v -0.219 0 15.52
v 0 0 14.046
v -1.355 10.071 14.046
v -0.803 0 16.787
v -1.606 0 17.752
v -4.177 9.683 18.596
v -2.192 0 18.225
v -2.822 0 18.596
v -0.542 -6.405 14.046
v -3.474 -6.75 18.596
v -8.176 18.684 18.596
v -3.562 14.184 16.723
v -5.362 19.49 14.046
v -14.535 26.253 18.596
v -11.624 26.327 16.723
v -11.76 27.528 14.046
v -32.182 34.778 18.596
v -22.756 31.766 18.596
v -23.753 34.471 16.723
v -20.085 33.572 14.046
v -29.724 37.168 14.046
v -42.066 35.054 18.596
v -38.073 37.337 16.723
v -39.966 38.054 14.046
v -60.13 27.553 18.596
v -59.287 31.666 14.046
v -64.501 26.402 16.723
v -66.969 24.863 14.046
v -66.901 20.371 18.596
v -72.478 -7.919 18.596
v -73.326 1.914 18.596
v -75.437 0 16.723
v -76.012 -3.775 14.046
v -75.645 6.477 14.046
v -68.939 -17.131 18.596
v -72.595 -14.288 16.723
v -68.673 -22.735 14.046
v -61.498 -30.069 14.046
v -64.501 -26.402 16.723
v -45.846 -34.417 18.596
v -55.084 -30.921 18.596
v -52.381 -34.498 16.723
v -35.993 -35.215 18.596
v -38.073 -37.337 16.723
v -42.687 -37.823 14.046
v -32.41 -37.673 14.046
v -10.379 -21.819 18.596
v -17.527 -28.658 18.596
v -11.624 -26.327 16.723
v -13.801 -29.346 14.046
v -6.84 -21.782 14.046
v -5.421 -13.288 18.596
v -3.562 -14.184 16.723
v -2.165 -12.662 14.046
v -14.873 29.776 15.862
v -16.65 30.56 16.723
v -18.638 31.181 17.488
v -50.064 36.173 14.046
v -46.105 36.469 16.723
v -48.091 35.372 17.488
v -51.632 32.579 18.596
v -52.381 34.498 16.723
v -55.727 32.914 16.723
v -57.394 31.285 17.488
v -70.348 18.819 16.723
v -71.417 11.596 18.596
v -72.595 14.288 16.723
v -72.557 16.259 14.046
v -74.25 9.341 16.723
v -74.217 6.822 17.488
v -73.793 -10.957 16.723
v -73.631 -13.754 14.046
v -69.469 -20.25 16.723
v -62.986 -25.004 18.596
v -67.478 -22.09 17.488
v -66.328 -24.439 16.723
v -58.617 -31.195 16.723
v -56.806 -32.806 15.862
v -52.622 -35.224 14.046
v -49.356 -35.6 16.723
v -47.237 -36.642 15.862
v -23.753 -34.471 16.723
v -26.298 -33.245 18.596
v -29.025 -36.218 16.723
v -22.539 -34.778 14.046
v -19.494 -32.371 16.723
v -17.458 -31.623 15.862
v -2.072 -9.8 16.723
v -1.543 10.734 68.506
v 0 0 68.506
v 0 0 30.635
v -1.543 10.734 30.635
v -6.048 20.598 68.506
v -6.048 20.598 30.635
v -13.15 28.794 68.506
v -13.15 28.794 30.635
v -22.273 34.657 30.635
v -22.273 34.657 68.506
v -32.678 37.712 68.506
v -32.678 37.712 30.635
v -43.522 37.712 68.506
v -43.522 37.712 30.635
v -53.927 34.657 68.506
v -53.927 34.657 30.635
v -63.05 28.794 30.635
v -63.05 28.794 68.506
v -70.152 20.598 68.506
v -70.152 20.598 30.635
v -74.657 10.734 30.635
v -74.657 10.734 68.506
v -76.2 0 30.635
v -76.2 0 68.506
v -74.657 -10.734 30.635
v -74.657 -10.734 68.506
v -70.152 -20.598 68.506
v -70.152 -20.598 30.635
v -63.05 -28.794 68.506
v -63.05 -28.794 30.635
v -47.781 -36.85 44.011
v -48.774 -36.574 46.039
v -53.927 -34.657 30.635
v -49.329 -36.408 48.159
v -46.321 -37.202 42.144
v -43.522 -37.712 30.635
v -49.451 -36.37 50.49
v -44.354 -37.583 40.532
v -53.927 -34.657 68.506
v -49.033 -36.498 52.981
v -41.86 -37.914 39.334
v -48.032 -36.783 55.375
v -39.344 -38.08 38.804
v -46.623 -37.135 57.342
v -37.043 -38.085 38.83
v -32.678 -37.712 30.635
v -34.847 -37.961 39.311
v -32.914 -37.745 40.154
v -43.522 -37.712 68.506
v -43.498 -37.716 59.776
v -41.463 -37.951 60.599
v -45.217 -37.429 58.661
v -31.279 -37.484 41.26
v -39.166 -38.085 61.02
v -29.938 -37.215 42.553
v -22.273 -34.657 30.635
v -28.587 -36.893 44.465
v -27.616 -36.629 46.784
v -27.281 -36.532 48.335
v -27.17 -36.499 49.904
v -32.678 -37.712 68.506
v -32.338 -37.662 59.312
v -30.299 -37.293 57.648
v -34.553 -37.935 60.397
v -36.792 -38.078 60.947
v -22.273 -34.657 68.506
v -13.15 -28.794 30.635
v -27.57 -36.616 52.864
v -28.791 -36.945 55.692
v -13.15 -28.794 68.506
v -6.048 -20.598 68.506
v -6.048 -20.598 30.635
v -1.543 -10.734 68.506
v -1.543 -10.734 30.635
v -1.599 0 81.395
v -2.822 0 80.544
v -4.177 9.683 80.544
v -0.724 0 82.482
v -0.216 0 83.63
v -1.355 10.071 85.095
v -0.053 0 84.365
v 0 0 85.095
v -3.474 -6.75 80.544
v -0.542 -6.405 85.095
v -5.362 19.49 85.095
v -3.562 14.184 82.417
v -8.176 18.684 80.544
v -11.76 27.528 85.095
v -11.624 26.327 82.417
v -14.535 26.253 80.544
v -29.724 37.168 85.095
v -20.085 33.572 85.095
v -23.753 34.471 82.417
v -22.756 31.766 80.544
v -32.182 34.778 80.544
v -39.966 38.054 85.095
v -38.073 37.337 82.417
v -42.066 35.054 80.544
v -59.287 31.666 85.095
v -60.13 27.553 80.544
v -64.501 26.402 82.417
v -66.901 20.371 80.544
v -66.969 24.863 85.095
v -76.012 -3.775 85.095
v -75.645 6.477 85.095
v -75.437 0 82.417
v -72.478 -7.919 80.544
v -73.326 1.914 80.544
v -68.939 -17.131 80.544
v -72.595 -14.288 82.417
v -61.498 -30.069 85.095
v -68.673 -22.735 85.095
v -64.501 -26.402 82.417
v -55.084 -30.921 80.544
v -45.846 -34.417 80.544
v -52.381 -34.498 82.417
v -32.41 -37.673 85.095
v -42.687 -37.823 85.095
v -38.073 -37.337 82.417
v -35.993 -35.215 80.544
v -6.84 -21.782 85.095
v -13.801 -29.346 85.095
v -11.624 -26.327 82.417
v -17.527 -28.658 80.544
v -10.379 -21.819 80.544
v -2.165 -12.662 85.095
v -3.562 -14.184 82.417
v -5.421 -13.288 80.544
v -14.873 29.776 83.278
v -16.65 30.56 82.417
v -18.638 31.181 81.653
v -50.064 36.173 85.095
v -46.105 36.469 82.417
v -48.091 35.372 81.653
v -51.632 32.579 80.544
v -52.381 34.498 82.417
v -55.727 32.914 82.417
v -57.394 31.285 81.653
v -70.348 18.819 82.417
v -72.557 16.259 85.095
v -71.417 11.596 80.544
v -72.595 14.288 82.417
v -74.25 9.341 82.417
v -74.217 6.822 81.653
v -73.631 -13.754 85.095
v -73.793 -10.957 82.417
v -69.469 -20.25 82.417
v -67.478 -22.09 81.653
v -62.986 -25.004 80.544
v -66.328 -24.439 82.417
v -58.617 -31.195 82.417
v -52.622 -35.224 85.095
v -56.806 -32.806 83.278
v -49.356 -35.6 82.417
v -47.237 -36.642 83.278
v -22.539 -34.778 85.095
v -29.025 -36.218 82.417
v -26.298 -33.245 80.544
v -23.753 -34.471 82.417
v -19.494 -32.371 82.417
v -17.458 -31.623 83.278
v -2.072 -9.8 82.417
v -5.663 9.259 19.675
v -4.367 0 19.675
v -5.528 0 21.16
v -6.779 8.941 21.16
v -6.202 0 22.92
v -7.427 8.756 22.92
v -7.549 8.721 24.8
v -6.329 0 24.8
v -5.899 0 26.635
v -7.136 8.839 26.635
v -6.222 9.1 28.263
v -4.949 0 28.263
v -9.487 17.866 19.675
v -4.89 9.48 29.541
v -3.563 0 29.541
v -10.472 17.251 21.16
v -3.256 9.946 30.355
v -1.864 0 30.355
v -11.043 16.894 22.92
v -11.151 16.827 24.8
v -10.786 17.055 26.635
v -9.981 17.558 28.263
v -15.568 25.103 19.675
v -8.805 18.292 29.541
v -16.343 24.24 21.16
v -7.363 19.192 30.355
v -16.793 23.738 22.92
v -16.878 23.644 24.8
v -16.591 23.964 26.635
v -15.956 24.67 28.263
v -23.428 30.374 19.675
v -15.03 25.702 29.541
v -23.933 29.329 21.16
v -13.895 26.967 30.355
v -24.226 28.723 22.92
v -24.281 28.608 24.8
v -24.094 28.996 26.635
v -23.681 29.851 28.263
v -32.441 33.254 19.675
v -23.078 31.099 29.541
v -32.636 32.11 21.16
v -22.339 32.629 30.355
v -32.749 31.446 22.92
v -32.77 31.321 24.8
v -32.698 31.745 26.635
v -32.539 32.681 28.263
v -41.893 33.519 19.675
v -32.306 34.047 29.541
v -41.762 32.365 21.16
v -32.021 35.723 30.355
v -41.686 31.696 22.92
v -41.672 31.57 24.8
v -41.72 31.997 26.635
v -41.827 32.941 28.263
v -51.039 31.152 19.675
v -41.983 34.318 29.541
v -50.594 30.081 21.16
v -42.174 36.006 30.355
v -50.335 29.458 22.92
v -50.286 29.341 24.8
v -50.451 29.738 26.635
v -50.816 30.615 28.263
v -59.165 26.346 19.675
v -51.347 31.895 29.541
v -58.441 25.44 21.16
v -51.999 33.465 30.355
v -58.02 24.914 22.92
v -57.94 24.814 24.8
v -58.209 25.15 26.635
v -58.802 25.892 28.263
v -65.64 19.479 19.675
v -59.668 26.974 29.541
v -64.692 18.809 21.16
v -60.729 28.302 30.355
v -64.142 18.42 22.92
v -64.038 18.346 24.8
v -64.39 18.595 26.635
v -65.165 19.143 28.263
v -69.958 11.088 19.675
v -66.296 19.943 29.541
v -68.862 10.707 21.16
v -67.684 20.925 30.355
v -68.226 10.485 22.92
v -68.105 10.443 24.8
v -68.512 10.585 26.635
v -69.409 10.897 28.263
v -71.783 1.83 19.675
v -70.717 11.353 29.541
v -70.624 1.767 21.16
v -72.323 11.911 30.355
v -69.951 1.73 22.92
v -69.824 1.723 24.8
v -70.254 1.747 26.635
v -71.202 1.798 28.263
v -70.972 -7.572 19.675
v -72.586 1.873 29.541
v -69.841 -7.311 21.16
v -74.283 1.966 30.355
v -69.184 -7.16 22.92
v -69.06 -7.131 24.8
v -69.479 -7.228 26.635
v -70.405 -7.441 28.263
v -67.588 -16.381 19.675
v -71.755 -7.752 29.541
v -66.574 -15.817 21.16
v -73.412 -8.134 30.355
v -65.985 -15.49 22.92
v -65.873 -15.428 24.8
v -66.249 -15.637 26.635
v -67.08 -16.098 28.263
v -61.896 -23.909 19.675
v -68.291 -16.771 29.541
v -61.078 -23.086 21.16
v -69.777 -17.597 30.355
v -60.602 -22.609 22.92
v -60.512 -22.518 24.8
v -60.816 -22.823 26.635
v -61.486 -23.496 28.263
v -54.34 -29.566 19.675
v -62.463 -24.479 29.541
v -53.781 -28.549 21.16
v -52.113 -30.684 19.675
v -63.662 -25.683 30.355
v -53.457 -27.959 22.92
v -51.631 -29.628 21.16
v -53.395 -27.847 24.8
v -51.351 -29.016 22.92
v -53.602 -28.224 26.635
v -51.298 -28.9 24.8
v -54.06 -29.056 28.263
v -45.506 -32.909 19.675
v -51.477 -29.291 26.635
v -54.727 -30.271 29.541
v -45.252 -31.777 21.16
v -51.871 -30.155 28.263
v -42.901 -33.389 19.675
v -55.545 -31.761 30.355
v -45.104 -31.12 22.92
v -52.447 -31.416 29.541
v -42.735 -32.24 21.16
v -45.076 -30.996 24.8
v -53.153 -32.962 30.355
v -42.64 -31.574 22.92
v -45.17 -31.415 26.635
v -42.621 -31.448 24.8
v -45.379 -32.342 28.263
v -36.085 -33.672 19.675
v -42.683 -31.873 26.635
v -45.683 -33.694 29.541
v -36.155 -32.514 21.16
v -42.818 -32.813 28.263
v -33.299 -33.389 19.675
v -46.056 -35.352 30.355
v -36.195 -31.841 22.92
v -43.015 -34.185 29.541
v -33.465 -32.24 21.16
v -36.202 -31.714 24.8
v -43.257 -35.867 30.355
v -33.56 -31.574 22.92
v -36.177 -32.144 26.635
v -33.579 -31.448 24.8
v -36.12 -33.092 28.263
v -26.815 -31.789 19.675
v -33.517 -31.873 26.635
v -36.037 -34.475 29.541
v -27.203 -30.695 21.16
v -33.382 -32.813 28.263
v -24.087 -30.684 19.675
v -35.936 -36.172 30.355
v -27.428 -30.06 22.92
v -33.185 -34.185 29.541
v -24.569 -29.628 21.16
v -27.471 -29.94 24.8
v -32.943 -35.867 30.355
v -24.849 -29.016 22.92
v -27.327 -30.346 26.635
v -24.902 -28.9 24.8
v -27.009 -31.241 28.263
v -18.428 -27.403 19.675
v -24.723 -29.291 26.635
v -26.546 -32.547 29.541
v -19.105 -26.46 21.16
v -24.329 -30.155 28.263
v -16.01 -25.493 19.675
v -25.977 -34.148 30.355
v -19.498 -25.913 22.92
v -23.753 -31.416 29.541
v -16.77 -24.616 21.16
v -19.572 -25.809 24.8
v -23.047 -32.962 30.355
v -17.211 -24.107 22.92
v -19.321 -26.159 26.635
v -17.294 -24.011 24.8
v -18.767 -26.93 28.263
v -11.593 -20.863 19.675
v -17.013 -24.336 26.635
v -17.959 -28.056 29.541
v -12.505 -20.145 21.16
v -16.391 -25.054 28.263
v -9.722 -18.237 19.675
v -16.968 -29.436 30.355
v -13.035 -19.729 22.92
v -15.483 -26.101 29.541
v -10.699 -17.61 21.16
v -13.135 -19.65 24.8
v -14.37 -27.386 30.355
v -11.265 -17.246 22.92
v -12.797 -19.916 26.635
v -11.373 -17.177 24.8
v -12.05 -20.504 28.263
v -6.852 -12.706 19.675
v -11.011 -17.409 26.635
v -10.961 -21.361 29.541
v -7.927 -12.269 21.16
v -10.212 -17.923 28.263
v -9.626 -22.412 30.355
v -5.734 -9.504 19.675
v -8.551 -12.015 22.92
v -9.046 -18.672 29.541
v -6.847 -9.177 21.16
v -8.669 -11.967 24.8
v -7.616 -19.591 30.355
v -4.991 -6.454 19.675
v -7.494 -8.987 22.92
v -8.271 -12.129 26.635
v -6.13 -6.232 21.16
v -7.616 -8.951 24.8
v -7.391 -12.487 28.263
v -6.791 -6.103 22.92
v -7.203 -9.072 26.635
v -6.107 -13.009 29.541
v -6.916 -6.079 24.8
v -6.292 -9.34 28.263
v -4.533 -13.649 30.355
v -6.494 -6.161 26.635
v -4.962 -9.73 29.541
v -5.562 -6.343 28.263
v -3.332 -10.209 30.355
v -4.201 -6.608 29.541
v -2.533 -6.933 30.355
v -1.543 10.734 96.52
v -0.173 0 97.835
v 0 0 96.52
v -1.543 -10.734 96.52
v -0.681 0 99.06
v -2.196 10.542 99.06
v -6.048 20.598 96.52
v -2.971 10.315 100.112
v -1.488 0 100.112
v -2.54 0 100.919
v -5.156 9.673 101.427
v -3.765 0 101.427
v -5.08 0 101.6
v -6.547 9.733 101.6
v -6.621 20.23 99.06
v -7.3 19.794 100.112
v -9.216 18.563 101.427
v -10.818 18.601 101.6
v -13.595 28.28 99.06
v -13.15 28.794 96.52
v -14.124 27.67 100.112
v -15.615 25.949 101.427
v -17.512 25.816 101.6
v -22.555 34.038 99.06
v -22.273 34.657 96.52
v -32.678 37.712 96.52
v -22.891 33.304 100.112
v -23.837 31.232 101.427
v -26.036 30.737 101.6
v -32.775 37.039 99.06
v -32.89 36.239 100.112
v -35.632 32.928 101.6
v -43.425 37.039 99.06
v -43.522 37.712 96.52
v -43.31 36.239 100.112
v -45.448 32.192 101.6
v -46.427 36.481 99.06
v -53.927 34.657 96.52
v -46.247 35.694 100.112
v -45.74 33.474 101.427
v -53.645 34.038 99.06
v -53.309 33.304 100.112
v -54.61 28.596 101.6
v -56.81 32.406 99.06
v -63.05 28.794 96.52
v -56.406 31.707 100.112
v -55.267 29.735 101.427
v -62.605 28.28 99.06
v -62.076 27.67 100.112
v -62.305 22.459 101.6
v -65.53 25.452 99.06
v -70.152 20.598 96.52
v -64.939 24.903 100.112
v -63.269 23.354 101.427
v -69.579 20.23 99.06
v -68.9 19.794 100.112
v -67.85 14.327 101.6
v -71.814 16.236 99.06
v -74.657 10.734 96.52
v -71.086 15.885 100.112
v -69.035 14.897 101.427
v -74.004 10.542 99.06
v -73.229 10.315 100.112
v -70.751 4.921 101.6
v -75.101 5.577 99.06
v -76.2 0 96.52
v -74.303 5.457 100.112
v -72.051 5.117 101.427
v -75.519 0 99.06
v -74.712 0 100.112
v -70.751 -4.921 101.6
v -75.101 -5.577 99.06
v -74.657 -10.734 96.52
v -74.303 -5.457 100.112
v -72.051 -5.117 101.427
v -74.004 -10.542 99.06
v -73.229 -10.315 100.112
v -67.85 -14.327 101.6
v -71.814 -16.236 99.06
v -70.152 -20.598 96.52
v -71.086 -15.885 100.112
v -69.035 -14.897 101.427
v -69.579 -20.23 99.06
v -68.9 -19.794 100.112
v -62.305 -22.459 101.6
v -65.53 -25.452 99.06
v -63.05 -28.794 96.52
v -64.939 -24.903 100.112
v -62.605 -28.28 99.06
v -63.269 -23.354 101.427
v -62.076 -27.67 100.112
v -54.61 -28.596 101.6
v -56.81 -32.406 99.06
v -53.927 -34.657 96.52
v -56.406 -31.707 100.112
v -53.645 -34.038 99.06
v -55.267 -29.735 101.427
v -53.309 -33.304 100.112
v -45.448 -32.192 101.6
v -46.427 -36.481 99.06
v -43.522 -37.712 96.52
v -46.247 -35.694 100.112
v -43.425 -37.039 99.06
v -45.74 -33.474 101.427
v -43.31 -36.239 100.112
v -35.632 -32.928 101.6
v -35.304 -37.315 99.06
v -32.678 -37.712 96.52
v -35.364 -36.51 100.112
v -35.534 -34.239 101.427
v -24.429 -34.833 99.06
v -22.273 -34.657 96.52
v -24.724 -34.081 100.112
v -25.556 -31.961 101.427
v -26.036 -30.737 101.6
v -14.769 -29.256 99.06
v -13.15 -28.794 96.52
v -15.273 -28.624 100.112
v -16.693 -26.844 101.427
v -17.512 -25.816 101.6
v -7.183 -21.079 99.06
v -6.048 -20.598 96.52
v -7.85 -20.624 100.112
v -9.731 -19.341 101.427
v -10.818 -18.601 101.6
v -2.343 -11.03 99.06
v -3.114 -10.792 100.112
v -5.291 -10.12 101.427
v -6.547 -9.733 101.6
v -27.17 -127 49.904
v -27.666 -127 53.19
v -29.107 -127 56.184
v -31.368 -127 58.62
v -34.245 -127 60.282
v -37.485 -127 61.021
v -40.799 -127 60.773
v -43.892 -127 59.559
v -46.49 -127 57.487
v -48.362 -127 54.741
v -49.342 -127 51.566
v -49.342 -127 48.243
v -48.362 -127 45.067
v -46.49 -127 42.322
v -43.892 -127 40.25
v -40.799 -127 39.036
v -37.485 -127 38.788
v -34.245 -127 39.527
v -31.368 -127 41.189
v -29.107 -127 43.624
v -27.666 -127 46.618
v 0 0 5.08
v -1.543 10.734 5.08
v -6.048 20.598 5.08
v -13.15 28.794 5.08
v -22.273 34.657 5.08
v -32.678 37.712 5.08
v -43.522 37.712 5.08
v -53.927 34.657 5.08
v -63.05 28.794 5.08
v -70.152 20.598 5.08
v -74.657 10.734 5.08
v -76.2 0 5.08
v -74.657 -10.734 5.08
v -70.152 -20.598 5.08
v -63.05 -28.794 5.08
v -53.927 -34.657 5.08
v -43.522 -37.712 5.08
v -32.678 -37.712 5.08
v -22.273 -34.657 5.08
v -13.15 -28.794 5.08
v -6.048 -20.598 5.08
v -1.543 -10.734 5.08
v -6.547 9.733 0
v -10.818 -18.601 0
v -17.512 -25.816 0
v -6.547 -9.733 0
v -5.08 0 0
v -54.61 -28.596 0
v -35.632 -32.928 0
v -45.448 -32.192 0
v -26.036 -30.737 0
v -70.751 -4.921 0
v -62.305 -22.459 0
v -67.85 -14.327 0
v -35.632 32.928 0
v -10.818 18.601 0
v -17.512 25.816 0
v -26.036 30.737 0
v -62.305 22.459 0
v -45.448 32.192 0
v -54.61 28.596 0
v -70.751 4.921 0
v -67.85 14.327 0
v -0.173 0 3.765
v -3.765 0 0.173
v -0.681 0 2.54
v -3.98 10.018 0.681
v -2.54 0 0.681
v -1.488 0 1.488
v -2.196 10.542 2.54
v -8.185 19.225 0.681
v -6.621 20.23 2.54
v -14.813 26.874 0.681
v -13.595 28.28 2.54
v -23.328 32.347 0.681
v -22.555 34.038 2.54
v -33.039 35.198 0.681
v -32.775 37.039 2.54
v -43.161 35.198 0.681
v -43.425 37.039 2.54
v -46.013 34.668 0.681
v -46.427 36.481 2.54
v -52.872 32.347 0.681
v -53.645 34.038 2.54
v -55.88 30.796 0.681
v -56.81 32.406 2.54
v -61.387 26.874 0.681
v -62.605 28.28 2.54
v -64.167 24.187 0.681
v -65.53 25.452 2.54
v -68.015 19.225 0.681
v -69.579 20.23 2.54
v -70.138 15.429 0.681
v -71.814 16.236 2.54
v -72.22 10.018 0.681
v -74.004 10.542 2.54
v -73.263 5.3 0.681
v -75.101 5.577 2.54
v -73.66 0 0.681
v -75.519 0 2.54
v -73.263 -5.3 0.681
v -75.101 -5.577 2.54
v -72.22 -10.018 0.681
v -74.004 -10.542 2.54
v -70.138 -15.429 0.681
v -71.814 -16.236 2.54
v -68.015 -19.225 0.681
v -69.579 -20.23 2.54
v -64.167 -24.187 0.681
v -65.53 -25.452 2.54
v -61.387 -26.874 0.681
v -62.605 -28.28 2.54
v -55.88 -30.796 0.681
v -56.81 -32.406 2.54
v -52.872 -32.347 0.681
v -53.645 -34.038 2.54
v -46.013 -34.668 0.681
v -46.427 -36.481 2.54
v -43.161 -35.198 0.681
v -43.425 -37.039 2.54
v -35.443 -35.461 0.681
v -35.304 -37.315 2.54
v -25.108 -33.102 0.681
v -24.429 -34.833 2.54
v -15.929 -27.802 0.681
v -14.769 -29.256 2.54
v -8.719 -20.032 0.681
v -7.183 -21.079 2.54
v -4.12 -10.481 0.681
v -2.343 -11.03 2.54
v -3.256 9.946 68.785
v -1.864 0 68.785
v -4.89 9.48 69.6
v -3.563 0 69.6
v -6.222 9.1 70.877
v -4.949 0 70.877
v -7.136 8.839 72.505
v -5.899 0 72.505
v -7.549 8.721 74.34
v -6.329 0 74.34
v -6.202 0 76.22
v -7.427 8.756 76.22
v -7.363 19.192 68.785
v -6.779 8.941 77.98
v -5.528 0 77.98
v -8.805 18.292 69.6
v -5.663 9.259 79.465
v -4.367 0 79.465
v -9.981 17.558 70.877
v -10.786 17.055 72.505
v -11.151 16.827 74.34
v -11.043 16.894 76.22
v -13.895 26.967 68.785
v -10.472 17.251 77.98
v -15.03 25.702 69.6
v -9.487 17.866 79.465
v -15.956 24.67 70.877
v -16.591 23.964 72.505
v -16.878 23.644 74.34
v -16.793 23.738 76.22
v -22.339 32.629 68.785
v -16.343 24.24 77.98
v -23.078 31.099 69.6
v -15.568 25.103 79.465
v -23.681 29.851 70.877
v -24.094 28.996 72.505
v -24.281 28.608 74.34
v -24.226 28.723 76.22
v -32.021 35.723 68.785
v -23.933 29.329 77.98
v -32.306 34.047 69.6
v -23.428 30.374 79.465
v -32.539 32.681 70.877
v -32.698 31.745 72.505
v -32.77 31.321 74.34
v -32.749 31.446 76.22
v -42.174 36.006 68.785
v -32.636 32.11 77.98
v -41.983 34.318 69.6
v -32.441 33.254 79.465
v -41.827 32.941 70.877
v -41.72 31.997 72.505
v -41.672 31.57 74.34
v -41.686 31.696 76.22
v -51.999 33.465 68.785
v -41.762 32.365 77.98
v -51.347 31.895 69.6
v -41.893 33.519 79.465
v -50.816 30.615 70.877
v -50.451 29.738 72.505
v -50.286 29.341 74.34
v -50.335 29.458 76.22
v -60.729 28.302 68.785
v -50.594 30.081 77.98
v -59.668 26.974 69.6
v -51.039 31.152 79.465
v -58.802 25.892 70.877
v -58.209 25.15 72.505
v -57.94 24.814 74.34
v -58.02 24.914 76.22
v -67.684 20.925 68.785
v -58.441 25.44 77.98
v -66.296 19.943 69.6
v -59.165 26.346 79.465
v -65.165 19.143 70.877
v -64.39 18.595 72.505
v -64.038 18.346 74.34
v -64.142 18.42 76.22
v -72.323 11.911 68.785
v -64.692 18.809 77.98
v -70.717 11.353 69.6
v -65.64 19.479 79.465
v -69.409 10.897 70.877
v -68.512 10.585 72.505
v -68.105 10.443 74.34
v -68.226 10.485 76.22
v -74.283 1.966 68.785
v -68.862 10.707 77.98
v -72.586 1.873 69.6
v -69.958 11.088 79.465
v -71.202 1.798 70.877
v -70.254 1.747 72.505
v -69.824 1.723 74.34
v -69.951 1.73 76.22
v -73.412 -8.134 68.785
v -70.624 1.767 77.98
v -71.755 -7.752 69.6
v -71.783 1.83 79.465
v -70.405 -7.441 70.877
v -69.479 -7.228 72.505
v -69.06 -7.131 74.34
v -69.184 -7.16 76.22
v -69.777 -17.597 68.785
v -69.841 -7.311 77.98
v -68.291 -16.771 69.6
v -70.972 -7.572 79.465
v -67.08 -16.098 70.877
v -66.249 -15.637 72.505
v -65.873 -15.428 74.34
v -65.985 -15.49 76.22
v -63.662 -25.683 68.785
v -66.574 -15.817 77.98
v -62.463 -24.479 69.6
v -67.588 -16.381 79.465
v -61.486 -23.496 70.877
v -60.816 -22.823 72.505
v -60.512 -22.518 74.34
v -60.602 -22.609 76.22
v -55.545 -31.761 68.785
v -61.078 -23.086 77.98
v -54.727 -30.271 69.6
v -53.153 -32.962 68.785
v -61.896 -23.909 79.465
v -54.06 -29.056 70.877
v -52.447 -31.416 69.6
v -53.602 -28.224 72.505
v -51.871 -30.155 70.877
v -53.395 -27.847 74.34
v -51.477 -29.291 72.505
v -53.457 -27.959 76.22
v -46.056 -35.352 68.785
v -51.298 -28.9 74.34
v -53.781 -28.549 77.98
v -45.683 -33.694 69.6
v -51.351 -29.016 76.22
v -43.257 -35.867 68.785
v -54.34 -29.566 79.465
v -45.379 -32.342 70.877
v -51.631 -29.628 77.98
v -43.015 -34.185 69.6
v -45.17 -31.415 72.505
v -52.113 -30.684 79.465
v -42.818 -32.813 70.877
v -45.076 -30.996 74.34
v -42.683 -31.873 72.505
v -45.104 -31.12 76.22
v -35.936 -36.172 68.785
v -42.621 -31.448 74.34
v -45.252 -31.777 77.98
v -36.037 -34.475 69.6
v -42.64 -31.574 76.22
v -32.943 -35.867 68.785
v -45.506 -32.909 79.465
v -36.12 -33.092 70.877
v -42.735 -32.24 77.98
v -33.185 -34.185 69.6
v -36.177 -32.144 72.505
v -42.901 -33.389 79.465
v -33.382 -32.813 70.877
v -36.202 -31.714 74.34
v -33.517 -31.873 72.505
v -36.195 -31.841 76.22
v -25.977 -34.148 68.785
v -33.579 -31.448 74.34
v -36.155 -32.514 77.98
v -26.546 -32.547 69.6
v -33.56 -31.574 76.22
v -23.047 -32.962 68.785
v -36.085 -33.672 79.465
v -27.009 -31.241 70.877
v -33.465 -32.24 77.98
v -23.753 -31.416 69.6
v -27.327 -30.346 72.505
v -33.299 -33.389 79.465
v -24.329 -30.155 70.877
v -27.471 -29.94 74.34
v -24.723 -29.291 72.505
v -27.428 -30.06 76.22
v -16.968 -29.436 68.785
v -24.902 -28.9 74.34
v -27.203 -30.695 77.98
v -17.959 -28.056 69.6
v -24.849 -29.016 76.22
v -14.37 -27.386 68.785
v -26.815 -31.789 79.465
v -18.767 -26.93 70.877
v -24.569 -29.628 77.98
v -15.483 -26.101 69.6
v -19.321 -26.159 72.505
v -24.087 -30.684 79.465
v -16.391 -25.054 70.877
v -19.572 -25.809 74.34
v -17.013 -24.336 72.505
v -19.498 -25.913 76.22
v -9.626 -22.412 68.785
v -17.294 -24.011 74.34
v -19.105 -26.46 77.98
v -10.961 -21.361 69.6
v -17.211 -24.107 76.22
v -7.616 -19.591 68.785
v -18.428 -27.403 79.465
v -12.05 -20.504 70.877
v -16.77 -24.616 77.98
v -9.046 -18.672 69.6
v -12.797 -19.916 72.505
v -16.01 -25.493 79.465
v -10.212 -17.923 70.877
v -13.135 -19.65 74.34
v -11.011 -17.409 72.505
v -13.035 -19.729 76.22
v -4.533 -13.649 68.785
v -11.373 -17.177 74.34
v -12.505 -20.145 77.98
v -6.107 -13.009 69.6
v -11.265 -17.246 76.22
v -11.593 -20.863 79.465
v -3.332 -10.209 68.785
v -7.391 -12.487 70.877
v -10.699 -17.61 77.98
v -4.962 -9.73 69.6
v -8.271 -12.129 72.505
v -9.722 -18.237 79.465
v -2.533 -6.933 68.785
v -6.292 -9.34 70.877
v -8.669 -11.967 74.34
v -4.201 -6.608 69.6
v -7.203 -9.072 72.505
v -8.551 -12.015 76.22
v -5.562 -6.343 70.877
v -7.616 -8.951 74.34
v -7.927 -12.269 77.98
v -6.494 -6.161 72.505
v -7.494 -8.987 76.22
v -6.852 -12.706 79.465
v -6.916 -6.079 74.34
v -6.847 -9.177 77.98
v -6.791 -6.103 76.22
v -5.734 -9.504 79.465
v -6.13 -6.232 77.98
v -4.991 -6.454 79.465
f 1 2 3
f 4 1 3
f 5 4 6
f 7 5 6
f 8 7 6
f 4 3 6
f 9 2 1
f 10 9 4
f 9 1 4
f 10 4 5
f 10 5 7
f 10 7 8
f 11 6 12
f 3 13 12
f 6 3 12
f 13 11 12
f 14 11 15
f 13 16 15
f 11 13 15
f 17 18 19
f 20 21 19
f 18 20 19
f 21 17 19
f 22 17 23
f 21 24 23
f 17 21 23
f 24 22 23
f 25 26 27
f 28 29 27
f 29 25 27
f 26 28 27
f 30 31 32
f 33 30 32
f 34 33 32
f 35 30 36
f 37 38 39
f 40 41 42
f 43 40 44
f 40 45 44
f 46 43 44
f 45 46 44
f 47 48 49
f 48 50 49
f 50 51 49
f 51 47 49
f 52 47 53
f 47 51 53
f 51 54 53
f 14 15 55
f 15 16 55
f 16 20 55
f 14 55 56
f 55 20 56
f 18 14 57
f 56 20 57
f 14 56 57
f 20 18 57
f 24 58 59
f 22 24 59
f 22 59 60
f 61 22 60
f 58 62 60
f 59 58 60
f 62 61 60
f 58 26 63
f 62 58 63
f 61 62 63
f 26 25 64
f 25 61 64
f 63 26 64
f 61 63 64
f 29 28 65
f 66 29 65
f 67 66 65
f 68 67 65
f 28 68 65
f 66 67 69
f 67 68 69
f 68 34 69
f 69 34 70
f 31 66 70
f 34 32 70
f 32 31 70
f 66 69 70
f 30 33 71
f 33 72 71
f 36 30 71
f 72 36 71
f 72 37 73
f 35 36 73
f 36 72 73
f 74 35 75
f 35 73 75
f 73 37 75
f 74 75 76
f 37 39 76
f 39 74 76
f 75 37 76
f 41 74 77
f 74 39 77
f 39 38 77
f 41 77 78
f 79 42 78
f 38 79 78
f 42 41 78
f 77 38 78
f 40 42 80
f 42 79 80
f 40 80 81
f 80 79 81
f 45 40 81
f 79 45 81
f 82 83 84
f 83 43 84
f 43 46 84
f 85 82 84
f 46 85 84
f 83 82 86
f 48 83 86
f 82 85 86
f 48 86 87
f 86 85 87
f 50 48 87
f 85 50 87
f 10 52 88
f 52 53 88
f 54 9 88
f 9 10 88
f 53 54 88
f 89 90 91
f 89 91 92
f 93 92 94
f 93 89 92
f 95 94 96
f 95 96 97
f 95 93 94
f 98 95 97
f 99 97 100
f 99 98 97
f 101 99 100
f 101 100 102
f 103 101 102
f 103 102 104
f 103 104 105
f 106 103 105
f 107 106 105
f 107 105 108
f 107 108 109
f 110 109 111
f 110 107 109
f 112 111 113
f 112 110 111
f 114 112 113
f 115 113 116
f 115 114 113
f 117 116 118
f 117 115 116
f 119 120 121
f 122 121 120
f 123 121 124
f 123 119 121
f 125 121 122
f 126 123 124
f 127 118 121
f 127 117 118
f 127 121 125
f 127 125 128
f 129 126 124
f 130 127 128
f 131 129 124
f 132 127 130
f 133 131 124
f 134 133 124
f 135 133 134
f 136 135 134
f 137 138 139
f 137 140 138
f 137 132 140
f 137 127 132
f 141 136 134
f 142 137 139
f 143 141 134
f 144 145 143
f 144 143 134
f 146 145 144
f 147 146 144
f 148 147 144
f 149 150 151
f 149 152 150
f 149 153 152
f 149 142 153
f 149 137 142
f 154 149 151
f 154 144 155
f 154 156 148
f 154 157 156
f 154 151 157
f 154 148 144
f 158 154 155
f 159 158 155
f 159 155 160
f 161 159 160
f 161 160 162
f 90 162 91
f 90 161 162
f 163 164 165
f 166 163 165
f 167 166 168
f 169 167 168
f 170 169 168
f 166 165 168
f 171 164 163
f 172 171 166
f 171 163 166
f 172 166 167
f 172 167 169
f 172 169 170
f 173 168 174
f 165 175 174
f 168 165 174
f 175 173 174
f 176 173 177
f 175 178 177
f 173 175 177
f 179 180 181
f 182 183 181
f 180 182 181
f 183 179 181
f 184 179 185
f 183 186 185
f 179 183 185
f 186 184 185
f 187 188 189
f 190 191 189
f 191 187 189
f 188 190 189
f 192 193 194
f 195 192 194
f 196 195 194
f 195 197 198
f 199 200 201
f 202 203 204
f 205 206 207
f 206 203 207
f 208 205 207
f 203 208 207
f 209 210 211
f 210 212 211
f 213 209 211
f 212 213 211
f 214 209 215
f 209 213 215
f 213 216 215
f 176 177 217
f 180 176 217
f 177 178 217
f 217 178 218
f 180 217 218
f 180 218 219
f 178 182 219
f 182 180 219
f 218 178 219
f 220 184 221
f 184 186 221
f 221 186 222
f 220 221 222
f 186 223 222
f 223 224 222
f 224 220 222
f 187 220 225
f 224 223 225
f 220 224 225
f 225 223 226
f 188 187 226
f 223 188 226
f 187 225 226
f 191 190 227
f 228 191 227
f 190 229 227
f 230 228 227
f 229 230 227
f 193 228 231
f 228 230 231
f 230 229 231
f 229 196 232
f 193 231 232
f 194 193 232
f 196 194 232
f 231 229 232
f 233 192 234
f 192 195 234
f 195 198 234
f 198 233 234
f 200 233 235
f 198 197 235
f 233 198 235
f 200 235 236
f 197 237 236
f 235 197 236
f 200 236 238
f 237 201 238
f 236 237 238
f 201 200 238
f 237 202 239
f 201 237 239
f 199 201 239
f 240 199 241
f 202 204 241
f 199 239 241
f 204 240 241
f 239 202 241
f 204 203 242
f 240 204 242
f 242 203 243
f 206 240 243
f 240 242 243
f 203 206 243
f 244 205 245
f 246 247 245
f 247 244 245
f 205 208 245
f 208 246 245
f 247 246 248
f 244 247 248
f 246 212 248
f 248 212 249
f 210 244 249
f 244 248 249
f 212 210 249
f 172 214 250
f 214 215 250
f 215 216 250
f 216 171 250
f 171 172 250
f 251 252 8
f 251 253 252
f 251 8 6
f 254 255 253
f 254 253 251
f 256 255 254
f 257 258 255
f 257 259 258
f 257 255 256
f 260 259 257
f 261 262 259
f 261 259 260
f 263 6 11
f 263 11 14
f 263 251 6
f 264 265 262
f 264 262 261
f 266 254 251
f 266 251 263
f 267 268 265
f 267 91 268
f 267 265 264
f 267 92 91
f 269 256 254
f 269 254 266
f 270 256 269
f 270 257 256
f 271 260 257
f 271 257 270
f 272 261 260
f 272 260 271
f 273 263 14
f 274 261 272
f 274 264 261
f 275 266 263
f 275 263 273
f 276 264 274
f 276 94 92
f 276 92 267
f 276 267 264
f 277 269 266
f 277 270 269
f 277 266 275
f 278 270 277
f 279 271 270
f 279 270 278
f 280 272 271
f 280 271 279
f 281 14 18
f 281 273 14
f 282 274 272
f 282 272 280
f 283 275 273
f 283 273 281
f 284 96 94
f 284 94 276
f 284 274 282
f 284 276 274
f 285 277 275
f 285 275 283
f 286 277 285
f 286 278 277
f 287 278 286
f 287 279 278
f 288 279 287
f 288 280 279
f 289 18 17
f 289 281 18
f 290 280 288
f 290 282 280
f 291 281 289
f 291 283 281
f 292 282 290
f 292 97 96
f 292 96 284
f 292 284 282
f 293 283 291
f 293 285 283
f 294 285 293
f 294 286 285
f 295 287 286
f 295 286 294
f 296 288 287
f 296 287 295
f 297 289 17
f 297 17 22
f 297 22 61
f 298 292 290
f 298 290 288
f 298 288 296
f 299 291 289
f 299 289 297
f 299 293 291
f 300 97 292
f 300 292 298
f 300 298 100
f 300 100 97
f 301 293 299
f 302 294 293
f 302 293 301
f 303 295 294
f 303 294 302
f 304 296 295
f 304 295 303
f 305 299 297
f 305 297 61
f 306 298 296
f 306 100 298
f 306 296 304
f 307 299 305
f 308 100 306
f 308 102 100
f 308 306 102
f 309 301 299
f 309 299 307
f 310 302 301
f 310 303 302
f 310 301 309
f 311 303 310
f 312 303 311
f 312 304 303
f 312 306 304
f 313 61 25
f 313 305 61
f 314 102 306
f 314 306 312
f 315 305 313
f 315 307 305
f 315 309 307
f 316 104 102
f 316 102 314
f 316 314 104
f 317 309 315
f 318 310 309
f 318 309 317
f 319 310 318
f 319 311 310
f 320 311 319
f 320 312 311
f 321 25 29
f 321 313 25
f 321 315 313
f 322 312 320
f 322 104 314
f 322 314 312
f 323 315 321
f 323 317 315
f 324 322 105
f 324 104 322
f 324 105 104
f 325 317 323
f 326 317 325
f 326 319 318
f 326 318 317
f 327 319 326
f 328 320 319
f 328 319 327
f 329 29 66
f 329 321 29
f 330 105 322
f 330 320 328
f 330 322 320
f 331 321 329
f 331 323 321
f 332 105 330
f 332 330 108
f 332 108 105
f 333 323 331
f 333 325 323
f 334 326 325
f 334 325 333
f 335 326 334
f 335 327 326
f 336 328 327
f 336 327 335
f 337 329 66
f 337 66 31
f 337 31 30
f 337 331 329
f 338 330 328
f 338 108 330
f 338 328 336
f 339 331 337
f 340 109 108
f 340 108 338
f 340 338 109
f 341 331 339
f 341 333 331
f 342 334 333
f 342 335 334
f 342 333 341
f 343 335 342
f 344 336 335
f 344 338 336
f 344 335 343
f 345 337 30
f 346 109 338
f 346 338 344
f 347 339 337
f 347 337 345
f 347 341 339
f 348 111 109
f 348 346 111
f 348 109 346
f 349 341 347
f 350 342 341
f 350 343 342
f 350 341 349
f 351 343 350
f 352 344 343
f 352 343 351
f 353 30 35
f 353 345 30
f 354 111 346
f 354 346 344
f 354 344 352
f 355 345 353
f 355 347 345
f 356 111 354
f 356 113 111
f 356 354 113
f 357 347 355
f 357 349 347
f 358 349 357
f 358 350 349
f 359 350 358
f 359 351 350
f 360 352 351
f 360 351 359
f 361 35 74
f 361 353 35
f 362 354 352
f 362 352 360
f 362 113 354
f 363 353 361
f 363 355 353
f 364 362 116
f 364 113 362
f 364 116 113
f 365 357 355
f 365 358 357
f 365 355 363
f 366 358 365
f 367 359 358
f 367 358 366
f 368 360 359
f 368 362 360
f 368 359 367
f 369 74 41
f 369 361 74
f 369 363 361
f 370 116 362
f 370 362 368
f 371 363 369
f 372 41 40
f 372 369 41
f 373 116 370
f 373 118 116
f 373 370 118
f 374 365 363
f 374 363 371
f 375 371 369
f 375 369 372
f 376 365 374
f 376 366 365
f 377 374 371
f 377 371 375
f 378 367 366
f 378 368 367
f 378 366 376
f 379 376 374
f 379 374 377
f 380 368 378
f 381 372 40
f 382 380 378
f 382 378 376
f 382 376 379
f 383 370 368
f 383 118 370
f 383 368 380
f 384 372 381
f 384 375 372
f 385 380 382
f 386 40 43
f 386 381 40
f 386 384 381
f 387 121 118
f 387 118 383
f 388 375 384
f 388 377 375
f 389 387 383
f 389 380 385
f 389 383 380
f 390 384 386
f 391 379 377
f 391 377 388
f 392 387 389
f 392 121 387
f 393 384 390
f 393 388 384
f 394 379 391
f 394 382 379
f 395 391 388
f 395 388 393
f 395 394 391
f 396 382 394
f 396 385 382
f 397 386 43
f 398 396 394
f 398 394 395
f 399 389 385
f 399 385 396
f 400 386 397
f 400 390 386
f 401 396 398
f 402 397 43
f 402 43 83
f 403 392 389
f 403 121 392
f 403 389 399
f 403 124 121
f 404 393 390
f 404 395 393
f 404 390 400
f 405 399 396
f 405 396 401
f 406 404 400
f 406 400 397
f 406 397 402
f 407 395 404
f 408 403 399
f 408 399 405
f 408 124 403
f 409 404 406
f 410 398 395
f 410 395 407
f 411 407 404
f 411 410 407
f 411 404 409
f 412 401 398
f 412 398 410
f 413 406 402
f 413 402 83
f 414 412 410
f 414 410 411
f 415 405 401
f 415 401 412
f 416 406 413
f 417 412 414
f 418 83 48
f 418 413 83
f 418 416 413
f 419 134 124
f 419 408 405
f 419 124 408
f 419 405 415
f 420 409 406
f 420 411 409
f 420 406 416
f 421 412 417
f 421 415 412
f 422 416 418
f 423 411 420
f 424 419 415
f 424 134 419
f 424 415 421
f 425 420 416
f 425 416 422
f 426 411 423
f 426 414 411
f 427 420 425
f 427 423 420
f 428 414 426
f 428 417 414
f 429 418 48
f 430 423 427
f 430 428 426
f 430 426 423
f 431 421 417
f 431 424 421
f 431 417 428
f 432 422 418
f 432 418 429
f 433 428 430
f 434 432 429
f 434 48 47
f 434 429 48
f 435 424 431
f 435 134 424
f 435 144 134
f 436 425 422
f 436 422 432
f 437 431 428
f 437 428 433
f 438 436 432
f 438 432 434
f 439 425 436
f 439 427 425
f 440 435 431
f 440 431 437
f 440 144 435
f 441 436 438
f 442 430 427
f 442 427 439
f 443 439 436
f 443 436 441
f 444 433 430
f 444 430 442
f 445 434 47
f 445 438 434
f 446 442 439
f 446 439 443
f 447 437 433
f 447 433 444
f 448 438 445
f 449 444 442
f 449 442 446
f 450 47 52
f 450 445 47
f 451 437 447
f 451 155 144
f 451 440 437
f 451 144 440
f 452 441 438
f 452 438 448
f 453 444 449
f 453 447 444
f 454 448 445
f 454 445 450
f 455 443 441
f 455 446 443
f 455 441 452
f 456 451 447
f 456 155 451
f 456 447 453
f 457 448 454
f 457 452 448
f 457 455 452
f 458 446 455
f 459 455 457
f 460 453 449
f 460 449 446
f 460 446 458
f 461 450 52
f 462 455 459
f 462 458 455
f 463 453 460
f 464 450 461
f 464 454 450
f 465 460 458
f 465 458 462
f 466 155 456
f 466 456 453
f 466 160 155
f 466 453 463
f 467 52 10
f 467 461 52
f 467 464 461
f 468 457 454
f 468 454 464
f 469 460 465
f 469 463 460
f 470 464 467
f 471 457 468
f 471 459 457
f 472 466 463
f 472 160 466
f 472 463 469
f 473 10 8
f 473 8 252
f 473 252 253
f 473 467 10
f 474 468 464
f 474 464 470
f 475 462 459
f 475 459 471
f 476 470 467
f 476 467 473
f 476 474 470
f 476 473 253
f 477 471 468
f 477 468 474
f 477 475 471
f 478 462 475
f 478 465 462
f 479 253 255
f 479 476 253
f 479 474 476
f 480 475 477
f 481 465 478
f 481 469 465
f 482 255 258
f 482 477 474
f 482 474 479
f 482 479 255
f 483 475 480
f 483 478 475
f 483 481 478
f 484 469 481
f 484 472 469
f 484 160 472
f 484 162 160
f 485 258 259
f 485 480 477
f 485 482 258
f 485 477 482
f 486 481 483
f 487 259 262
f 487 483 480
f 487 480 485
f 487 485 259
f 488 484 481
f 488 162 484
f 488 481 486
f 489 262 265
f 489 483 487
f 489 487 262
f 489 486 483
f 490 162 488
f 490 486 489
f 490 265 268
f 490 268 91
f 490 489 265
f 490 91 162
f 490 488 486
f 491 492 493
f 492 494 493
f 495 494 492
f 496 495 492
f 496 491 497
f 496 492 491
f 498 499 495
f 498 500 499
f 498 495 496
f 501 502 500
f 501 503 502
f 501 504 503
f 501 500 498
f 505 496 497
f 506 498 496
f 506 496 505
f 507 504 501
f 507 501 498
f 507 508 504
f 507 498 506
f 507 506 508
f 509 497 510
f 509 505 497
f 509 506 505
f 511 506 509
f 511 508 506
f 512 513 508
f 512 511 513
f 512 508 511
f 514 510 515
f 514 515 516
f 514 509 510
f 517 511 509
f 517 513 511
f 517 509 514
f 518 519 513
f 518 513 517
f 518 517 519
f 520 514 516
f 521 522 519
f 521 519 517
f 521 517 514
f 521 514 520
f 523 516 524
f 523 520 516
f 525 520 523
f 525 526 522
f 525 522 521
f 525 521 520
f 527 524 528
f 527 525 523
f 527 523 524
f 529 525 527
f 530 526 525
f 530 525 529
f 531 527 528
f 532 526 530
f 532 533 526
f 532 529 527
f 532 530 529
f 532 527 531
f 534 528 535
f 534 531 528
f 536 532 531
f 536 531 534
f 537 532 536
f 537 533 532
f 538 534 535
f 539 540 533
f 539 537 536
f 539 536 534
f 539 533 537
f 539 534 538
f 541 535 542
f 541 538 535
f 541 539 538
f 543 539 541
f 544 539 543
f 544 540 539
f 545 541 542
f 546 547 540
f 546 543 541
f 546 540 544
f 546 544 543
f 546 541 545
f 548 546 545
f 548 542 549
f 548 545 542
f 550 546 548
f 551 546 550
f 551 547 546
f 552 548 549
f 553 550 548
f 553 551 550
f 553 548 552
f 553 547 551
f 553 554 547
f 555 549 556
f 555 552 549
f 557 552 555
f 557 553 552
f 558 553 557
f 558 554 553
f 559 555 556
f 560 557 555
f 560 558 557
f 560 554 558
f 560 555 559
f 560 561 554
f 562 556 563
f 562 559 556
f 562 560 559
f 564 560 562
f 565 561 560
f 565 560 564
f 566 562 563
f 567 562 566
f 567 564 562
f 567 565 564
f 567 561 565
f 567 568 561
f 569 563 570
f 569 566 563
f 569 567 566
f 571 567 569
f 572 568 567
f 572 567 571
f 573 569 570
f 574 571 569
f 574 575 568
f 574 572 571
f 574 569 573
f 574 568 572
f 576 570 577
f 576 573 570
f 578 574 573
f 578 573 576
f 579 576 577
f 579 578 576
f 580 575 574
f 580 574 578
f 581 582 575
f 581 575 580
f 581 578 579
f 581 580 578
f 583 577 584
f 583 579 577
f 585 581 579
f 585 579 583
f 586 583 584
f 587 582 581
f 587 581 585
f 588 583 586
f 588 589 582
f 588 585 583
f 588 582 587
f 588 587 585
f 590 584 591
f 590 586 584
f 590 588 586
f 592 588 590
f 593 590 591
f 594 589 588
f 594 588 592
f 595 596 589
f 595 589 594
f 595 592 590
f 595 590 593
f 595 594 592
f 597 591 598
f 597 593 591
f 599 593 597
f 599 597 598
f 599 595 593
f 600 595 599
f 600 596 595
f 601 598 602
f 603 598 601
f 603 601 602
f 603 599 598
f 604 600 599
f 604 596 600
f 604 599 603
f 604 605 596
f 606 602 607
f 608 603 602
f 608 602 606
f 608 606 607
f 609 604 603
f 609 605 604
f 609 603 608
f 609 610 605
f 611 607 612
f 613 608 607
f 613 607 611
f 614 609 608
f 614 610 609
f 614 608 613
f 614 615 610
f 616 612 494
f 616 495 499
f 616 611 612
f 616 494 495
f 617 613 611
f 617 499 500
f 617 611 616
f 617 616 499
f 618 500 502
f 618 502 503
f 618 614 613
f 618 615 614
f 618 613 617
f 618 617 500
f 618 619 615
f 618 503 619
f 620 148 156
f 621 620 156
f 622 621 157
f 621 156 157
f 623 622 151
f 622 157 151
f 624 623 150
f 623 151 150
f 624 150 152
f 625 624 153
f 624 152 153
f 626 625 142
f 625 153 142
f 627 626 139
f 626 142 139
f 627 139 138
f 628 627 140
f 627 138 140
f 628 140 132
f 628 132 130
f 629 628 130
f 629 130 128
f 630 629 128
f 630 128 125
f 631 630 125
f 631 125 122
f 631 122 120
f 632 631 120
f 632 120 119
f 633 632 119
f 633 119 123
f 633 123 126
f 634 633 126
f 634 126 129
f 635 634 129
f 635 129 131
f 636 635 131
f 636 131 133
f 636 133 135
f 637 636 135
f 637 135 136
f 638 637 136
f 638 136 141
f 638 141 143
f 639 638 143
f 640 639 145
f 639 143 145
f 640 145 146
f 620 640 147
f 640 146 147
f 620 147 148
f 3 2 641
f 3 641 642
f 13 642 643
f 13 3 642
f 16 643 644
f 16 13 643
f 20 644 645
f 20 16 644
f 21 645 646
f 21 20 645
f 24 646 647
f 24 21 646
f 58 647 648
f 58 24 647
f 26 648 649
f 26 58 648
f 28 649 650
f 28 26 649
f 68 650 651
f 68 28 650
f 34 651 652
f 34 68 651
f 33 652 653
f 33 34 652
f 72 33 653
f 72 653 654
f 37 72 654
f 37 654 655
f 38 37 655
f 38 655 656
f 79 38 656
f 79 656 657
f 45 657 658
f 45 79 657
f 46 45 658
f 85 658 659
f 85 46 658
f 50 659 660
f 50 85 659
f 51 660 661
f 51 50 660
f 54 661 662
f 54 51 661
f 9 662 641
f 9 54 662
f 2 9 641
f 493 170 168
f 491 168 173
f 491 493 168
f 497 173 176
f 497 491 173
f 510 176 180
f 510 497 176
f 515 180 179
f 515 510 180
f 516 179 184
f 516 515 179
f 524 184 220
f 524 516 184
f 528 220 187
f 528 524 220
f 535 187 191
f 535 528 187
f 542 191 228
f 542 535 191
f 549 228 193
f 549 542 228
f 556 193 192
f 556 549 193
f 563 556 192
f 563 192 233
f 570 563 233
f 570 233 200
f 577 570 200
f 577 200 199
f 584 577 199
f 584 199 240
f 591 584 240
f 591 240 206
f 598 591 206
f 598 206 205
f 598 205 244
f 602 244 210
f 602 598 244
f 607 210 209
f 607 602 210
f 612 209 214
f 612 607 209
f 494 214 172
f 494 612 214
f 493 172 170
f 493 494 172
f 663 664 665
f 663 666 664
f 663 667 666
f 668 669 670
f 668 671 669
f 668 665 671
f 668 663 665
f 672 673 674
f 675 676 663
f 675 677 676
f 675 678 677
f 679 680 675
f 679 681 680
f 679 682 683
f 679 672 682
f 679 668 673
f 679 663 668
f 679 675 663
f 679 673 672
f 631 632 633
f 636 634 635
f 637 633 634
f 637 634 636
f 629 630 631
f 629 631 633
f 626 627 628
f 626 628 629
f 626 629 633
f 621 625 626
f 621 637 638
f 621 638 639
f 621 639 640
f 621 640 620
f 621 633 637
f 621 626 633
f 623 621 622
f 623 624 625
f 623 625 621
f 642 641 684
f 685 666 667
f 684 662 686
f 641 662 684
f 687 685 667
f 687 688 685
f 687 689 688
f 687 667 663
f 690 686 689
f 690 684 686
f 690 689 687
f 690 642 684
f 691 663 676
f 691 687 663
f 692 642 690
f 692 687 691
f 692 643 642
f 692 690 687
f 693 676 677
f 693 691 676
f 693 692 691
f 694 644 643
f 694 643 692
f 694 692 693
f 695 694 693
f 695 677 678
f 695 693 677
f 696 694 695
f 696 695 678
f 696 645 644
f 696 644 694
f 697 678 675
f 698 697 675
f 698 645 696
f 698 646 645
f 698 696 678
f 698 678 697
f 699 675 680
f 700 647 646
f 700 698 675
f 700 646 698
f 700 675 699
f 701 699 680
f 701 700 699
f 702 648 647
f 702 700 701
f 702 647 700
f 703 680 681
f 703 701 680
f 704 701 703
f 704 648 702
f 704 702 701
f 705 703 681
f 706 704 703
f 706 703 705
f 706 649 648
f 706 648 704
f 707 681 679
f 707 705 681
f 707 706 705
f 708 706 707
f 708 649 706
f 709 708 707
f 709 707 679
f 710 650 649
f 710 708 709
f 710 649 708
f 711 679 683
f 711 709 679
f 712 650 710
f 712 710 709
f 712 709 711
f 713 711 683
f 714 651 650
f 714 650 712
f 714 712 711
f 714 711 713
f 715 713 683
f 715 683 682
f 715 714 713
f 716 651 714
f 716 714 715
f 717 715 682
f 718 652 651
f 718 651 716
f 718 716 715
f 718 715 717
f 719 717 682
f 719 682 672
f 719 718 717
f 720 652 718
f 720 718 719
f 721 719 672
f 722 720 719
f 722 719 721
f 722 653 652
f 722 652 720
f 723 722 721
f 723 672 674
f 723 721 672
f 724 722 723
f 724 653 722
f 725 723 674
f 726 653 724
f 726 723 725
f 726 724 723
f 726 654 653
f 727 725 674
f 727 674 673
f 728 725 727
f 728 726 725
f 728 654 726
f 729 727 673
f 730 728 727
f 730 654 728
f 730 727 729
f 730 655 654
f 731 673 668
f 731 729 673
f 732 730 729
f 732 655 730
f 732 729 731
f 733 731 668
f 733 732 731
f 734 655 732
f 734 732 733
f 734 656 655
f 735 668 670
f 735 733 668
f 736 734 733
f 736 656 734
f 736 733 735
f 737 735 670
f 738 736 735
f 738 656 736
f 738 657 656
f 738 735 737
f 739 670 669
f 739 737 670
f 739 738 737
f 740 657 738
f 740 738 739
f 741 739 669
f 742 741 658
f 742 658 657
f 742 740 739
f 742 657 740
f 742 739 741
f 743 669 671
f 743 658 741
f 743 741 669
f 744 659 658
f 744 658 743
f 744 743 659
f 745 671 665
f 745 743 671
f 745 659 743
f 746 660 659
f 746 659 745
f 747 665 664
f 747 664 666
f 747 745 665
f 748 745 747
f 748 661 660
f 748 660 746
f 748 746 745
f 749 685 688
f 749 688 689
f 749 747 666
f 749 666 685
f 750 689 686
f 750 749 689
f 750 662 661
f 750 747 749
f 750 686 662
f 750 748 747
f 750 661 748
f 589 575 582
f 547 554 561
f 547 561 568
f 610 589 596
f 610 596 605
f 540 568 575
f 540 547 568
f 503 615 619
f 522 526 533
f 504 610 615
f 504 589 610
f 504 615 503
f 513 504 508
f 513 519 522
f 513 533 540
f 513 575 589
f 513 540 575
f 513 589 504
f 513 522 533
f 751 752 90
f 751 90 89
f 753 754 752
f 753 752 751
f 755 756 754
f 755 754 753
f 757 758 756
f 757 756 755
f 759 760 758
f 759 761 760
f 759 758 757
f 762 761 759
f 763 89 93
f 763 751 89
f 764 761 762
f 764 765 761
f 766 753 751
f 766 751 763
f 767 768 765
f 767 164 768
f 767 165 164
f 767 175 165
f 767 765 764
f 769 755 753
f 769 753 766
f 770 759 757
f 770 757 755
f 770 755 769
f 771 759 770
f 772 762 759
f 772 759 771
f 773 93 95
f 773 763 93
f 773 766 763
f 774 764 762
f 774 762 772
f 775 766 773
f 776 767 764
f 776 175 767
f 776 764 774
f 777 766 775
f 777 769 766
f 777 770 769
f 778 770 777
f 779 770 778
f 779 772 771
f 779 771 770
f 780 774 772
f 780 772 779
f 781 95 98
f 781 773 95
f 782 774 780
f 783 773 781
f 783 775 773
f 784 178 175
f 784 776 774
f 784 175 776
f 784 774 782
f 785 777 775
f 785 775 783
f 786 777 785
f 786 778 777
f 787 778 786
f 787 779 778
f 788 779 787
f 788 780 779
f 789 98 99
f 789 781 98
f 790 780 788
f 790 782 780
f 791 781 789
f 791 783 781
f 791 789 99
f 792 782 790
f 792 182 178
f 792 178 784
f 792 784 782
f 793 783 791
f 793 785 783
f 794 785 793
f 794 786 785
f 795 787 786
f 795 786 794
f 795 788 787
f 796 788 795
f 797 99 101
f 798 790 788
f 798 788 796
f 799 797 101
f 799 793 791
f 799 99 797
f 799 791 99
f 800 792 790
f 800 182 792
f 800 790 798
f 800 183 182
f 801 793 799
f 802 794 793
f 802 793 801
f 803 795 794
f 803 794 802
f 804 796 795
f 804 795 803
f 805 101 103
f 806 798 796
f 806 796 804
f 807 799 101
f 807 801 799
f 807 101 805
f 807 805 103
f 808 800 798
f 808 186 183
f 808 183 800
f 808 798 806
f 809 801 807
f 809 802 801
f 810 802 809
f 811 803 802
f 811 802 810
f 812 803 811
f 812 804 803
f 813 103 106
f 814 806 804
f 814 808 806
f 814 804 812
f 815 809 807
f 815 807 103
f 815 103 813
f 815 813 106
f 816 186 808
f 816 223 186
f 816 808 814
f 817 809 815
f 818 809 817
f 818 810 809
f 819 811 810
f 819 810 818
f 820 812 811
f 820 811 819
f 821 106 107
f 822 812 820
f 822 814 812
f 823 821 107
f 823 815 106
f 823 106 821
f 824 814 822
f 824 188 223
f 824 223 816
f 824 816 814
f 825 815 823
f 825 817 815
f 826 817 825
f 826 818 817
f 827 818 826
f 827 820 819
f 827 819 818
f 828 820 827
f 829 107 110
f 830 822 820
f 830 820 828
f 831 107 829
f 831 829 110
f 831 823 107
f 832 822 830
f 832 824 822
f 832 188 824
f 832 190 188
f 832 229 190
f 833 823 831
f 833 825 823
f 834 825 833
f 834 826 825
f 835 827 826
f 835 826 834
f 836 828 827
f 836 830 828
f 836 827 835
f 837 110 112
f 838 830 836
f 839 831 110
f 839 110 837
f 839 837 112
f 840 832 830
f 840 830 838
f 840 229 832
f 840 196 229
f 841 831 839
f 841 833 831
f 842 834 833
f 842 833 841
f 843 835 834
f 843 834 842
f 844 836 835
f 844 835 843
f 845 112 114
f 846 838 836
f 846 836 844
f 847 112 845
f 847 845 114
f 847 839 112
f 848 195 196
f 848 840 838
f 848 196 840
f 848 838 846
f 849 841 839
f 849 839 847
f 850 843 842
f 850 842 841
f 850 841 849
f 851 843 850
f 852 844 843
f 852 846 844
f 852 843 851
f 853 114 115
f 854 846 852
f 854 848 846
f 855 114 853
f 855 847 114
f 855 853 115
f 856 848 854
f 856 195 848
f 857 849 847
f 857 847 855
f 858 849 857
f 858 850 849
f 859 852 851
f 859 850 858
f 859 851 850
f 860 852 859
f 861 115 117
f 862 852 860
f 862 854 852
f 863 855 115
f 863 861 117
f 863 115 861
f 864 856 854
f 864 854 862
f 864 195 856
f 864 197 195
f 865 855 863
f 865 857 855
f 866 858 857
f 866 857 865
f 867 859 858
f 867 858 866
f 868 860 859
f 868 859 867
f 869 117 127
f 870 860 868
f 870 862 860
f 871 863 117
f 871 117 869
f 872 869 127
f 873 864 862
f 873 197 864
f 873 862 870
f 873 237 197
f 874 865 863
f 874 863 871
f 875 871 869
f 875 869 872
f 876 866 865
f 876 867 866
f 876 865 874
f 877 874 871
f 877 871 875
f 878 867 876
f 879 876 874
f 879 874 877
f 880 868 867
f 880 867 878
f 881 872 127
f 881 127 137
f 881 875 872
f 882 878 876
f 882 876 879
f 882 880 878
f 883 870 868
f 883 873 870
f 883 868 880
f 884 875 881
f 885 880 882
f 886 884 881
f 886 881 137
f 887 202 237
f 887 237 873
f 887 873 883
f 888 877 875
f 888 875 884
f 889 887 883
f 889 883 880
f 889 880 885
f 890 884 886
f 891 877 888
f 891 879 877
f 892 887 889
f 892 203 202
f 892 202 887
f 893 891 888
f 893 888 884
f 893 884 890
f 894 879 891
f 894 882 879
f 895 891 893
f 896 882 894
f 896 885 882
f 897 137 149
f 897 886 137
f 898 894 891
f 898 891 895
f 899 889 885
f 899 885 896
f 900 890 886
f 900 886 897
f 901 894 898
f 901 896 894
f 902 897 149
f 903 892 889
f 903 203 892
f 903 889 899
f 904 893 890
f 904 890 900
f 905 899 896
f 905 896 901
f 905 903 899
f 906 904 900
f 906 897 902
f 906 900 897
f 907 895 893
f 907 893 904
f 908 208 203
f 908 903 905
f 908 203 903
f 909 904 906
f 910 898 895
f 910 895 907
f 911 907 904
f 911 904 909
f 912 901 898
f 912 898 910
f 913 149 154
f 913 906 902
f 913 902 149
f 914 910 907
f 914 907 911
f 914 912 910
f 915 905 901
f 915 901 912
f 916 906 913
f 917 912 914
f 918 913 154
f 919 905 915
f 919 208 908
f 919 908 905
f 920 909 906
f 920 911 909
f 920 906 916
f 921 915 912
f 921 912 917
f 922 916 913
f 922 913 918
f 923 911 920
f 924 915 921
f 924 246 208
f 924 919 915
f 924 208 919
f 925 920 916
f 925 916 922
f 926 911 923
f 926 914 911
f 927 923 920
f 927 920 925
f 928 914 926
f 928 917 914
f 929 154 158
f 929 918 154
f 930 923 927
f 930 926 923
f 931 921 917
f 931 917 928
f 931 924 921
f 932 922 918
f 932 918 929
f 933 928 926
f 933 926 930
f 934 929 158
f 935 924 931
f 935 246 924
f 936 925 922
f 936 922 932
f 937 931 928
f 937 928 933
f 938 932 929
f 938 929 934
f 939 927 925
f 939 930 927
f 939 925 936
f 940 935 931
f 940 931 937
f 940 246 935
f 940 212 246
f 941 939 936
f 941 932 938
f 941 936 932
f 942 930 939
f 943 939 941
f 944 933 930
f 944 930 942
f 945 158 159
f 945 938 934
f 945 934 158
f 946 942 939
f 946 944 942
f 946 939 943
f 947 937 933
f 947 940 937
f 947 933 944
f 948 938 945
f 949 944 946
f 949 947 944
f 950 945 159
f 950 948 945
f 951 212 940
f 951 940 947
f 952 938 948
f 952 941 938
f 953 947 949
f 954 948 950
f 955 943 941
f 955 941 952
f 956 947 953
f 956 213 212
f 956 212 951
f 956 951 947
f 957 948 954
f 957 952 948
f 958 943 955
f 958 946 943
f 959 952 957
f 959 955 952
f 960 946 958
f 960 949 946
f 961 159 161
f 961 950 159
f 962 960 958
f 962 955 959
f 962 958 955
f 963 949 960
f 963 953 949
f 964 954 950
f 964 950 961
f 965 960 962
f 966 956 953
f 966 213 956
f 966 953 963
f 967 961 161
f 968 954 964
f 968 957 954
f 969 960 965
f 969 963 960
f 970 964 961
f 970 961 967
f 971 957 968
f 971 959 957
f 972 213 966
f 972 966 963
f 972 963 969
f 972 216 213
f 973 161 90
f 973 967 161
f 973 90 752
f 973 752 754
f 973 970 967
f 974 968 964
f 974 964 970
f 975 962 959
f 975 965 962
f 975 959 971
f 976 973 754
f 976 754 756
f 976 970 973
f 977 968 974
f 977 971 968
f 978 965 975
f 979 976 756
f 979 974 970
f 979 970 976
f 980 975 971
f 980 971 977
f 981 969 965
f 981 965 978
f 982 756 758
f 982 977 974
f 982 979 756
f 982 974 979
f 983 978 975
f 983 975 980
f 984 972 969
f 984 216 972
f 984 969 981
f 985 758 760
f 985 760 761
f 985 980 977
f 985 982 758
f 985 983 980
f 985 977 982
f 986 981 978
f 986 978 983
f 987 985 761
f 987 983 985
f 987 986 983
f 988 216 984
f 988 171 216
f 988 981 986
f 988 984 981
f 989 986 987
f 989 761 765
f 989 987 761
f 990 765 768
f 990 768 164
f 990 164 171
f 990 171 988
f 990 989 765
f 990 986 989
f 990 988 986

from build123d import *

# Parameters (mm, degrees)
F2_R     = 5.08
F3_R     = 11.147924
F4_DEPTH = 127


with BuildPart() as f1:
    # F0 (on Front) → F1 (revolve)
    with BuildSketch(Plane.XZ):
        with BuildLine():
            Line((-38.1, 0), (0, 0))
            Line((0, 0), (0, 17.934583))
            ThreePointArc((0, 17.934583), (-6.35, 24.284583), (0, 30.634583))
            Line((0, 30.634583), (0, 68.505745))
            ThreePointArc((0, 68.505745), (-6.35, 74.855745), (0, 81.205745))
            Line((0, 81.205745), (0, 101.6))
            Line((0, 101.6), (-38.1, 101.6))
            Line((-38.1, 101.6), (-38.1, 0))
        make_face()
    revolve(axis=Axis((-38.1, 0, 50.8), (0, 0, 1)))

    # F2
    f2_edges = [f1.edges().sort_by_distance(p)[0] for p in [
        (-76.2, 0, 101.6),
        (-76.2, 0, 0),
        (-76.2, 0, 17.934583),
        (0, 0, 8.967291),
        (-76.2, 0, 81.205745),
    ]]
    fillet(f2_edges, radius=F2_R)

    # F3 (on Front) → F4 (join)
    with BuildSketch(Plane.XZ):
        with Locations((-38.318235, 49.904328)):
            Circle(F3_R)
    extrude(amount=F4_DEPTH)


solid = f1.part
